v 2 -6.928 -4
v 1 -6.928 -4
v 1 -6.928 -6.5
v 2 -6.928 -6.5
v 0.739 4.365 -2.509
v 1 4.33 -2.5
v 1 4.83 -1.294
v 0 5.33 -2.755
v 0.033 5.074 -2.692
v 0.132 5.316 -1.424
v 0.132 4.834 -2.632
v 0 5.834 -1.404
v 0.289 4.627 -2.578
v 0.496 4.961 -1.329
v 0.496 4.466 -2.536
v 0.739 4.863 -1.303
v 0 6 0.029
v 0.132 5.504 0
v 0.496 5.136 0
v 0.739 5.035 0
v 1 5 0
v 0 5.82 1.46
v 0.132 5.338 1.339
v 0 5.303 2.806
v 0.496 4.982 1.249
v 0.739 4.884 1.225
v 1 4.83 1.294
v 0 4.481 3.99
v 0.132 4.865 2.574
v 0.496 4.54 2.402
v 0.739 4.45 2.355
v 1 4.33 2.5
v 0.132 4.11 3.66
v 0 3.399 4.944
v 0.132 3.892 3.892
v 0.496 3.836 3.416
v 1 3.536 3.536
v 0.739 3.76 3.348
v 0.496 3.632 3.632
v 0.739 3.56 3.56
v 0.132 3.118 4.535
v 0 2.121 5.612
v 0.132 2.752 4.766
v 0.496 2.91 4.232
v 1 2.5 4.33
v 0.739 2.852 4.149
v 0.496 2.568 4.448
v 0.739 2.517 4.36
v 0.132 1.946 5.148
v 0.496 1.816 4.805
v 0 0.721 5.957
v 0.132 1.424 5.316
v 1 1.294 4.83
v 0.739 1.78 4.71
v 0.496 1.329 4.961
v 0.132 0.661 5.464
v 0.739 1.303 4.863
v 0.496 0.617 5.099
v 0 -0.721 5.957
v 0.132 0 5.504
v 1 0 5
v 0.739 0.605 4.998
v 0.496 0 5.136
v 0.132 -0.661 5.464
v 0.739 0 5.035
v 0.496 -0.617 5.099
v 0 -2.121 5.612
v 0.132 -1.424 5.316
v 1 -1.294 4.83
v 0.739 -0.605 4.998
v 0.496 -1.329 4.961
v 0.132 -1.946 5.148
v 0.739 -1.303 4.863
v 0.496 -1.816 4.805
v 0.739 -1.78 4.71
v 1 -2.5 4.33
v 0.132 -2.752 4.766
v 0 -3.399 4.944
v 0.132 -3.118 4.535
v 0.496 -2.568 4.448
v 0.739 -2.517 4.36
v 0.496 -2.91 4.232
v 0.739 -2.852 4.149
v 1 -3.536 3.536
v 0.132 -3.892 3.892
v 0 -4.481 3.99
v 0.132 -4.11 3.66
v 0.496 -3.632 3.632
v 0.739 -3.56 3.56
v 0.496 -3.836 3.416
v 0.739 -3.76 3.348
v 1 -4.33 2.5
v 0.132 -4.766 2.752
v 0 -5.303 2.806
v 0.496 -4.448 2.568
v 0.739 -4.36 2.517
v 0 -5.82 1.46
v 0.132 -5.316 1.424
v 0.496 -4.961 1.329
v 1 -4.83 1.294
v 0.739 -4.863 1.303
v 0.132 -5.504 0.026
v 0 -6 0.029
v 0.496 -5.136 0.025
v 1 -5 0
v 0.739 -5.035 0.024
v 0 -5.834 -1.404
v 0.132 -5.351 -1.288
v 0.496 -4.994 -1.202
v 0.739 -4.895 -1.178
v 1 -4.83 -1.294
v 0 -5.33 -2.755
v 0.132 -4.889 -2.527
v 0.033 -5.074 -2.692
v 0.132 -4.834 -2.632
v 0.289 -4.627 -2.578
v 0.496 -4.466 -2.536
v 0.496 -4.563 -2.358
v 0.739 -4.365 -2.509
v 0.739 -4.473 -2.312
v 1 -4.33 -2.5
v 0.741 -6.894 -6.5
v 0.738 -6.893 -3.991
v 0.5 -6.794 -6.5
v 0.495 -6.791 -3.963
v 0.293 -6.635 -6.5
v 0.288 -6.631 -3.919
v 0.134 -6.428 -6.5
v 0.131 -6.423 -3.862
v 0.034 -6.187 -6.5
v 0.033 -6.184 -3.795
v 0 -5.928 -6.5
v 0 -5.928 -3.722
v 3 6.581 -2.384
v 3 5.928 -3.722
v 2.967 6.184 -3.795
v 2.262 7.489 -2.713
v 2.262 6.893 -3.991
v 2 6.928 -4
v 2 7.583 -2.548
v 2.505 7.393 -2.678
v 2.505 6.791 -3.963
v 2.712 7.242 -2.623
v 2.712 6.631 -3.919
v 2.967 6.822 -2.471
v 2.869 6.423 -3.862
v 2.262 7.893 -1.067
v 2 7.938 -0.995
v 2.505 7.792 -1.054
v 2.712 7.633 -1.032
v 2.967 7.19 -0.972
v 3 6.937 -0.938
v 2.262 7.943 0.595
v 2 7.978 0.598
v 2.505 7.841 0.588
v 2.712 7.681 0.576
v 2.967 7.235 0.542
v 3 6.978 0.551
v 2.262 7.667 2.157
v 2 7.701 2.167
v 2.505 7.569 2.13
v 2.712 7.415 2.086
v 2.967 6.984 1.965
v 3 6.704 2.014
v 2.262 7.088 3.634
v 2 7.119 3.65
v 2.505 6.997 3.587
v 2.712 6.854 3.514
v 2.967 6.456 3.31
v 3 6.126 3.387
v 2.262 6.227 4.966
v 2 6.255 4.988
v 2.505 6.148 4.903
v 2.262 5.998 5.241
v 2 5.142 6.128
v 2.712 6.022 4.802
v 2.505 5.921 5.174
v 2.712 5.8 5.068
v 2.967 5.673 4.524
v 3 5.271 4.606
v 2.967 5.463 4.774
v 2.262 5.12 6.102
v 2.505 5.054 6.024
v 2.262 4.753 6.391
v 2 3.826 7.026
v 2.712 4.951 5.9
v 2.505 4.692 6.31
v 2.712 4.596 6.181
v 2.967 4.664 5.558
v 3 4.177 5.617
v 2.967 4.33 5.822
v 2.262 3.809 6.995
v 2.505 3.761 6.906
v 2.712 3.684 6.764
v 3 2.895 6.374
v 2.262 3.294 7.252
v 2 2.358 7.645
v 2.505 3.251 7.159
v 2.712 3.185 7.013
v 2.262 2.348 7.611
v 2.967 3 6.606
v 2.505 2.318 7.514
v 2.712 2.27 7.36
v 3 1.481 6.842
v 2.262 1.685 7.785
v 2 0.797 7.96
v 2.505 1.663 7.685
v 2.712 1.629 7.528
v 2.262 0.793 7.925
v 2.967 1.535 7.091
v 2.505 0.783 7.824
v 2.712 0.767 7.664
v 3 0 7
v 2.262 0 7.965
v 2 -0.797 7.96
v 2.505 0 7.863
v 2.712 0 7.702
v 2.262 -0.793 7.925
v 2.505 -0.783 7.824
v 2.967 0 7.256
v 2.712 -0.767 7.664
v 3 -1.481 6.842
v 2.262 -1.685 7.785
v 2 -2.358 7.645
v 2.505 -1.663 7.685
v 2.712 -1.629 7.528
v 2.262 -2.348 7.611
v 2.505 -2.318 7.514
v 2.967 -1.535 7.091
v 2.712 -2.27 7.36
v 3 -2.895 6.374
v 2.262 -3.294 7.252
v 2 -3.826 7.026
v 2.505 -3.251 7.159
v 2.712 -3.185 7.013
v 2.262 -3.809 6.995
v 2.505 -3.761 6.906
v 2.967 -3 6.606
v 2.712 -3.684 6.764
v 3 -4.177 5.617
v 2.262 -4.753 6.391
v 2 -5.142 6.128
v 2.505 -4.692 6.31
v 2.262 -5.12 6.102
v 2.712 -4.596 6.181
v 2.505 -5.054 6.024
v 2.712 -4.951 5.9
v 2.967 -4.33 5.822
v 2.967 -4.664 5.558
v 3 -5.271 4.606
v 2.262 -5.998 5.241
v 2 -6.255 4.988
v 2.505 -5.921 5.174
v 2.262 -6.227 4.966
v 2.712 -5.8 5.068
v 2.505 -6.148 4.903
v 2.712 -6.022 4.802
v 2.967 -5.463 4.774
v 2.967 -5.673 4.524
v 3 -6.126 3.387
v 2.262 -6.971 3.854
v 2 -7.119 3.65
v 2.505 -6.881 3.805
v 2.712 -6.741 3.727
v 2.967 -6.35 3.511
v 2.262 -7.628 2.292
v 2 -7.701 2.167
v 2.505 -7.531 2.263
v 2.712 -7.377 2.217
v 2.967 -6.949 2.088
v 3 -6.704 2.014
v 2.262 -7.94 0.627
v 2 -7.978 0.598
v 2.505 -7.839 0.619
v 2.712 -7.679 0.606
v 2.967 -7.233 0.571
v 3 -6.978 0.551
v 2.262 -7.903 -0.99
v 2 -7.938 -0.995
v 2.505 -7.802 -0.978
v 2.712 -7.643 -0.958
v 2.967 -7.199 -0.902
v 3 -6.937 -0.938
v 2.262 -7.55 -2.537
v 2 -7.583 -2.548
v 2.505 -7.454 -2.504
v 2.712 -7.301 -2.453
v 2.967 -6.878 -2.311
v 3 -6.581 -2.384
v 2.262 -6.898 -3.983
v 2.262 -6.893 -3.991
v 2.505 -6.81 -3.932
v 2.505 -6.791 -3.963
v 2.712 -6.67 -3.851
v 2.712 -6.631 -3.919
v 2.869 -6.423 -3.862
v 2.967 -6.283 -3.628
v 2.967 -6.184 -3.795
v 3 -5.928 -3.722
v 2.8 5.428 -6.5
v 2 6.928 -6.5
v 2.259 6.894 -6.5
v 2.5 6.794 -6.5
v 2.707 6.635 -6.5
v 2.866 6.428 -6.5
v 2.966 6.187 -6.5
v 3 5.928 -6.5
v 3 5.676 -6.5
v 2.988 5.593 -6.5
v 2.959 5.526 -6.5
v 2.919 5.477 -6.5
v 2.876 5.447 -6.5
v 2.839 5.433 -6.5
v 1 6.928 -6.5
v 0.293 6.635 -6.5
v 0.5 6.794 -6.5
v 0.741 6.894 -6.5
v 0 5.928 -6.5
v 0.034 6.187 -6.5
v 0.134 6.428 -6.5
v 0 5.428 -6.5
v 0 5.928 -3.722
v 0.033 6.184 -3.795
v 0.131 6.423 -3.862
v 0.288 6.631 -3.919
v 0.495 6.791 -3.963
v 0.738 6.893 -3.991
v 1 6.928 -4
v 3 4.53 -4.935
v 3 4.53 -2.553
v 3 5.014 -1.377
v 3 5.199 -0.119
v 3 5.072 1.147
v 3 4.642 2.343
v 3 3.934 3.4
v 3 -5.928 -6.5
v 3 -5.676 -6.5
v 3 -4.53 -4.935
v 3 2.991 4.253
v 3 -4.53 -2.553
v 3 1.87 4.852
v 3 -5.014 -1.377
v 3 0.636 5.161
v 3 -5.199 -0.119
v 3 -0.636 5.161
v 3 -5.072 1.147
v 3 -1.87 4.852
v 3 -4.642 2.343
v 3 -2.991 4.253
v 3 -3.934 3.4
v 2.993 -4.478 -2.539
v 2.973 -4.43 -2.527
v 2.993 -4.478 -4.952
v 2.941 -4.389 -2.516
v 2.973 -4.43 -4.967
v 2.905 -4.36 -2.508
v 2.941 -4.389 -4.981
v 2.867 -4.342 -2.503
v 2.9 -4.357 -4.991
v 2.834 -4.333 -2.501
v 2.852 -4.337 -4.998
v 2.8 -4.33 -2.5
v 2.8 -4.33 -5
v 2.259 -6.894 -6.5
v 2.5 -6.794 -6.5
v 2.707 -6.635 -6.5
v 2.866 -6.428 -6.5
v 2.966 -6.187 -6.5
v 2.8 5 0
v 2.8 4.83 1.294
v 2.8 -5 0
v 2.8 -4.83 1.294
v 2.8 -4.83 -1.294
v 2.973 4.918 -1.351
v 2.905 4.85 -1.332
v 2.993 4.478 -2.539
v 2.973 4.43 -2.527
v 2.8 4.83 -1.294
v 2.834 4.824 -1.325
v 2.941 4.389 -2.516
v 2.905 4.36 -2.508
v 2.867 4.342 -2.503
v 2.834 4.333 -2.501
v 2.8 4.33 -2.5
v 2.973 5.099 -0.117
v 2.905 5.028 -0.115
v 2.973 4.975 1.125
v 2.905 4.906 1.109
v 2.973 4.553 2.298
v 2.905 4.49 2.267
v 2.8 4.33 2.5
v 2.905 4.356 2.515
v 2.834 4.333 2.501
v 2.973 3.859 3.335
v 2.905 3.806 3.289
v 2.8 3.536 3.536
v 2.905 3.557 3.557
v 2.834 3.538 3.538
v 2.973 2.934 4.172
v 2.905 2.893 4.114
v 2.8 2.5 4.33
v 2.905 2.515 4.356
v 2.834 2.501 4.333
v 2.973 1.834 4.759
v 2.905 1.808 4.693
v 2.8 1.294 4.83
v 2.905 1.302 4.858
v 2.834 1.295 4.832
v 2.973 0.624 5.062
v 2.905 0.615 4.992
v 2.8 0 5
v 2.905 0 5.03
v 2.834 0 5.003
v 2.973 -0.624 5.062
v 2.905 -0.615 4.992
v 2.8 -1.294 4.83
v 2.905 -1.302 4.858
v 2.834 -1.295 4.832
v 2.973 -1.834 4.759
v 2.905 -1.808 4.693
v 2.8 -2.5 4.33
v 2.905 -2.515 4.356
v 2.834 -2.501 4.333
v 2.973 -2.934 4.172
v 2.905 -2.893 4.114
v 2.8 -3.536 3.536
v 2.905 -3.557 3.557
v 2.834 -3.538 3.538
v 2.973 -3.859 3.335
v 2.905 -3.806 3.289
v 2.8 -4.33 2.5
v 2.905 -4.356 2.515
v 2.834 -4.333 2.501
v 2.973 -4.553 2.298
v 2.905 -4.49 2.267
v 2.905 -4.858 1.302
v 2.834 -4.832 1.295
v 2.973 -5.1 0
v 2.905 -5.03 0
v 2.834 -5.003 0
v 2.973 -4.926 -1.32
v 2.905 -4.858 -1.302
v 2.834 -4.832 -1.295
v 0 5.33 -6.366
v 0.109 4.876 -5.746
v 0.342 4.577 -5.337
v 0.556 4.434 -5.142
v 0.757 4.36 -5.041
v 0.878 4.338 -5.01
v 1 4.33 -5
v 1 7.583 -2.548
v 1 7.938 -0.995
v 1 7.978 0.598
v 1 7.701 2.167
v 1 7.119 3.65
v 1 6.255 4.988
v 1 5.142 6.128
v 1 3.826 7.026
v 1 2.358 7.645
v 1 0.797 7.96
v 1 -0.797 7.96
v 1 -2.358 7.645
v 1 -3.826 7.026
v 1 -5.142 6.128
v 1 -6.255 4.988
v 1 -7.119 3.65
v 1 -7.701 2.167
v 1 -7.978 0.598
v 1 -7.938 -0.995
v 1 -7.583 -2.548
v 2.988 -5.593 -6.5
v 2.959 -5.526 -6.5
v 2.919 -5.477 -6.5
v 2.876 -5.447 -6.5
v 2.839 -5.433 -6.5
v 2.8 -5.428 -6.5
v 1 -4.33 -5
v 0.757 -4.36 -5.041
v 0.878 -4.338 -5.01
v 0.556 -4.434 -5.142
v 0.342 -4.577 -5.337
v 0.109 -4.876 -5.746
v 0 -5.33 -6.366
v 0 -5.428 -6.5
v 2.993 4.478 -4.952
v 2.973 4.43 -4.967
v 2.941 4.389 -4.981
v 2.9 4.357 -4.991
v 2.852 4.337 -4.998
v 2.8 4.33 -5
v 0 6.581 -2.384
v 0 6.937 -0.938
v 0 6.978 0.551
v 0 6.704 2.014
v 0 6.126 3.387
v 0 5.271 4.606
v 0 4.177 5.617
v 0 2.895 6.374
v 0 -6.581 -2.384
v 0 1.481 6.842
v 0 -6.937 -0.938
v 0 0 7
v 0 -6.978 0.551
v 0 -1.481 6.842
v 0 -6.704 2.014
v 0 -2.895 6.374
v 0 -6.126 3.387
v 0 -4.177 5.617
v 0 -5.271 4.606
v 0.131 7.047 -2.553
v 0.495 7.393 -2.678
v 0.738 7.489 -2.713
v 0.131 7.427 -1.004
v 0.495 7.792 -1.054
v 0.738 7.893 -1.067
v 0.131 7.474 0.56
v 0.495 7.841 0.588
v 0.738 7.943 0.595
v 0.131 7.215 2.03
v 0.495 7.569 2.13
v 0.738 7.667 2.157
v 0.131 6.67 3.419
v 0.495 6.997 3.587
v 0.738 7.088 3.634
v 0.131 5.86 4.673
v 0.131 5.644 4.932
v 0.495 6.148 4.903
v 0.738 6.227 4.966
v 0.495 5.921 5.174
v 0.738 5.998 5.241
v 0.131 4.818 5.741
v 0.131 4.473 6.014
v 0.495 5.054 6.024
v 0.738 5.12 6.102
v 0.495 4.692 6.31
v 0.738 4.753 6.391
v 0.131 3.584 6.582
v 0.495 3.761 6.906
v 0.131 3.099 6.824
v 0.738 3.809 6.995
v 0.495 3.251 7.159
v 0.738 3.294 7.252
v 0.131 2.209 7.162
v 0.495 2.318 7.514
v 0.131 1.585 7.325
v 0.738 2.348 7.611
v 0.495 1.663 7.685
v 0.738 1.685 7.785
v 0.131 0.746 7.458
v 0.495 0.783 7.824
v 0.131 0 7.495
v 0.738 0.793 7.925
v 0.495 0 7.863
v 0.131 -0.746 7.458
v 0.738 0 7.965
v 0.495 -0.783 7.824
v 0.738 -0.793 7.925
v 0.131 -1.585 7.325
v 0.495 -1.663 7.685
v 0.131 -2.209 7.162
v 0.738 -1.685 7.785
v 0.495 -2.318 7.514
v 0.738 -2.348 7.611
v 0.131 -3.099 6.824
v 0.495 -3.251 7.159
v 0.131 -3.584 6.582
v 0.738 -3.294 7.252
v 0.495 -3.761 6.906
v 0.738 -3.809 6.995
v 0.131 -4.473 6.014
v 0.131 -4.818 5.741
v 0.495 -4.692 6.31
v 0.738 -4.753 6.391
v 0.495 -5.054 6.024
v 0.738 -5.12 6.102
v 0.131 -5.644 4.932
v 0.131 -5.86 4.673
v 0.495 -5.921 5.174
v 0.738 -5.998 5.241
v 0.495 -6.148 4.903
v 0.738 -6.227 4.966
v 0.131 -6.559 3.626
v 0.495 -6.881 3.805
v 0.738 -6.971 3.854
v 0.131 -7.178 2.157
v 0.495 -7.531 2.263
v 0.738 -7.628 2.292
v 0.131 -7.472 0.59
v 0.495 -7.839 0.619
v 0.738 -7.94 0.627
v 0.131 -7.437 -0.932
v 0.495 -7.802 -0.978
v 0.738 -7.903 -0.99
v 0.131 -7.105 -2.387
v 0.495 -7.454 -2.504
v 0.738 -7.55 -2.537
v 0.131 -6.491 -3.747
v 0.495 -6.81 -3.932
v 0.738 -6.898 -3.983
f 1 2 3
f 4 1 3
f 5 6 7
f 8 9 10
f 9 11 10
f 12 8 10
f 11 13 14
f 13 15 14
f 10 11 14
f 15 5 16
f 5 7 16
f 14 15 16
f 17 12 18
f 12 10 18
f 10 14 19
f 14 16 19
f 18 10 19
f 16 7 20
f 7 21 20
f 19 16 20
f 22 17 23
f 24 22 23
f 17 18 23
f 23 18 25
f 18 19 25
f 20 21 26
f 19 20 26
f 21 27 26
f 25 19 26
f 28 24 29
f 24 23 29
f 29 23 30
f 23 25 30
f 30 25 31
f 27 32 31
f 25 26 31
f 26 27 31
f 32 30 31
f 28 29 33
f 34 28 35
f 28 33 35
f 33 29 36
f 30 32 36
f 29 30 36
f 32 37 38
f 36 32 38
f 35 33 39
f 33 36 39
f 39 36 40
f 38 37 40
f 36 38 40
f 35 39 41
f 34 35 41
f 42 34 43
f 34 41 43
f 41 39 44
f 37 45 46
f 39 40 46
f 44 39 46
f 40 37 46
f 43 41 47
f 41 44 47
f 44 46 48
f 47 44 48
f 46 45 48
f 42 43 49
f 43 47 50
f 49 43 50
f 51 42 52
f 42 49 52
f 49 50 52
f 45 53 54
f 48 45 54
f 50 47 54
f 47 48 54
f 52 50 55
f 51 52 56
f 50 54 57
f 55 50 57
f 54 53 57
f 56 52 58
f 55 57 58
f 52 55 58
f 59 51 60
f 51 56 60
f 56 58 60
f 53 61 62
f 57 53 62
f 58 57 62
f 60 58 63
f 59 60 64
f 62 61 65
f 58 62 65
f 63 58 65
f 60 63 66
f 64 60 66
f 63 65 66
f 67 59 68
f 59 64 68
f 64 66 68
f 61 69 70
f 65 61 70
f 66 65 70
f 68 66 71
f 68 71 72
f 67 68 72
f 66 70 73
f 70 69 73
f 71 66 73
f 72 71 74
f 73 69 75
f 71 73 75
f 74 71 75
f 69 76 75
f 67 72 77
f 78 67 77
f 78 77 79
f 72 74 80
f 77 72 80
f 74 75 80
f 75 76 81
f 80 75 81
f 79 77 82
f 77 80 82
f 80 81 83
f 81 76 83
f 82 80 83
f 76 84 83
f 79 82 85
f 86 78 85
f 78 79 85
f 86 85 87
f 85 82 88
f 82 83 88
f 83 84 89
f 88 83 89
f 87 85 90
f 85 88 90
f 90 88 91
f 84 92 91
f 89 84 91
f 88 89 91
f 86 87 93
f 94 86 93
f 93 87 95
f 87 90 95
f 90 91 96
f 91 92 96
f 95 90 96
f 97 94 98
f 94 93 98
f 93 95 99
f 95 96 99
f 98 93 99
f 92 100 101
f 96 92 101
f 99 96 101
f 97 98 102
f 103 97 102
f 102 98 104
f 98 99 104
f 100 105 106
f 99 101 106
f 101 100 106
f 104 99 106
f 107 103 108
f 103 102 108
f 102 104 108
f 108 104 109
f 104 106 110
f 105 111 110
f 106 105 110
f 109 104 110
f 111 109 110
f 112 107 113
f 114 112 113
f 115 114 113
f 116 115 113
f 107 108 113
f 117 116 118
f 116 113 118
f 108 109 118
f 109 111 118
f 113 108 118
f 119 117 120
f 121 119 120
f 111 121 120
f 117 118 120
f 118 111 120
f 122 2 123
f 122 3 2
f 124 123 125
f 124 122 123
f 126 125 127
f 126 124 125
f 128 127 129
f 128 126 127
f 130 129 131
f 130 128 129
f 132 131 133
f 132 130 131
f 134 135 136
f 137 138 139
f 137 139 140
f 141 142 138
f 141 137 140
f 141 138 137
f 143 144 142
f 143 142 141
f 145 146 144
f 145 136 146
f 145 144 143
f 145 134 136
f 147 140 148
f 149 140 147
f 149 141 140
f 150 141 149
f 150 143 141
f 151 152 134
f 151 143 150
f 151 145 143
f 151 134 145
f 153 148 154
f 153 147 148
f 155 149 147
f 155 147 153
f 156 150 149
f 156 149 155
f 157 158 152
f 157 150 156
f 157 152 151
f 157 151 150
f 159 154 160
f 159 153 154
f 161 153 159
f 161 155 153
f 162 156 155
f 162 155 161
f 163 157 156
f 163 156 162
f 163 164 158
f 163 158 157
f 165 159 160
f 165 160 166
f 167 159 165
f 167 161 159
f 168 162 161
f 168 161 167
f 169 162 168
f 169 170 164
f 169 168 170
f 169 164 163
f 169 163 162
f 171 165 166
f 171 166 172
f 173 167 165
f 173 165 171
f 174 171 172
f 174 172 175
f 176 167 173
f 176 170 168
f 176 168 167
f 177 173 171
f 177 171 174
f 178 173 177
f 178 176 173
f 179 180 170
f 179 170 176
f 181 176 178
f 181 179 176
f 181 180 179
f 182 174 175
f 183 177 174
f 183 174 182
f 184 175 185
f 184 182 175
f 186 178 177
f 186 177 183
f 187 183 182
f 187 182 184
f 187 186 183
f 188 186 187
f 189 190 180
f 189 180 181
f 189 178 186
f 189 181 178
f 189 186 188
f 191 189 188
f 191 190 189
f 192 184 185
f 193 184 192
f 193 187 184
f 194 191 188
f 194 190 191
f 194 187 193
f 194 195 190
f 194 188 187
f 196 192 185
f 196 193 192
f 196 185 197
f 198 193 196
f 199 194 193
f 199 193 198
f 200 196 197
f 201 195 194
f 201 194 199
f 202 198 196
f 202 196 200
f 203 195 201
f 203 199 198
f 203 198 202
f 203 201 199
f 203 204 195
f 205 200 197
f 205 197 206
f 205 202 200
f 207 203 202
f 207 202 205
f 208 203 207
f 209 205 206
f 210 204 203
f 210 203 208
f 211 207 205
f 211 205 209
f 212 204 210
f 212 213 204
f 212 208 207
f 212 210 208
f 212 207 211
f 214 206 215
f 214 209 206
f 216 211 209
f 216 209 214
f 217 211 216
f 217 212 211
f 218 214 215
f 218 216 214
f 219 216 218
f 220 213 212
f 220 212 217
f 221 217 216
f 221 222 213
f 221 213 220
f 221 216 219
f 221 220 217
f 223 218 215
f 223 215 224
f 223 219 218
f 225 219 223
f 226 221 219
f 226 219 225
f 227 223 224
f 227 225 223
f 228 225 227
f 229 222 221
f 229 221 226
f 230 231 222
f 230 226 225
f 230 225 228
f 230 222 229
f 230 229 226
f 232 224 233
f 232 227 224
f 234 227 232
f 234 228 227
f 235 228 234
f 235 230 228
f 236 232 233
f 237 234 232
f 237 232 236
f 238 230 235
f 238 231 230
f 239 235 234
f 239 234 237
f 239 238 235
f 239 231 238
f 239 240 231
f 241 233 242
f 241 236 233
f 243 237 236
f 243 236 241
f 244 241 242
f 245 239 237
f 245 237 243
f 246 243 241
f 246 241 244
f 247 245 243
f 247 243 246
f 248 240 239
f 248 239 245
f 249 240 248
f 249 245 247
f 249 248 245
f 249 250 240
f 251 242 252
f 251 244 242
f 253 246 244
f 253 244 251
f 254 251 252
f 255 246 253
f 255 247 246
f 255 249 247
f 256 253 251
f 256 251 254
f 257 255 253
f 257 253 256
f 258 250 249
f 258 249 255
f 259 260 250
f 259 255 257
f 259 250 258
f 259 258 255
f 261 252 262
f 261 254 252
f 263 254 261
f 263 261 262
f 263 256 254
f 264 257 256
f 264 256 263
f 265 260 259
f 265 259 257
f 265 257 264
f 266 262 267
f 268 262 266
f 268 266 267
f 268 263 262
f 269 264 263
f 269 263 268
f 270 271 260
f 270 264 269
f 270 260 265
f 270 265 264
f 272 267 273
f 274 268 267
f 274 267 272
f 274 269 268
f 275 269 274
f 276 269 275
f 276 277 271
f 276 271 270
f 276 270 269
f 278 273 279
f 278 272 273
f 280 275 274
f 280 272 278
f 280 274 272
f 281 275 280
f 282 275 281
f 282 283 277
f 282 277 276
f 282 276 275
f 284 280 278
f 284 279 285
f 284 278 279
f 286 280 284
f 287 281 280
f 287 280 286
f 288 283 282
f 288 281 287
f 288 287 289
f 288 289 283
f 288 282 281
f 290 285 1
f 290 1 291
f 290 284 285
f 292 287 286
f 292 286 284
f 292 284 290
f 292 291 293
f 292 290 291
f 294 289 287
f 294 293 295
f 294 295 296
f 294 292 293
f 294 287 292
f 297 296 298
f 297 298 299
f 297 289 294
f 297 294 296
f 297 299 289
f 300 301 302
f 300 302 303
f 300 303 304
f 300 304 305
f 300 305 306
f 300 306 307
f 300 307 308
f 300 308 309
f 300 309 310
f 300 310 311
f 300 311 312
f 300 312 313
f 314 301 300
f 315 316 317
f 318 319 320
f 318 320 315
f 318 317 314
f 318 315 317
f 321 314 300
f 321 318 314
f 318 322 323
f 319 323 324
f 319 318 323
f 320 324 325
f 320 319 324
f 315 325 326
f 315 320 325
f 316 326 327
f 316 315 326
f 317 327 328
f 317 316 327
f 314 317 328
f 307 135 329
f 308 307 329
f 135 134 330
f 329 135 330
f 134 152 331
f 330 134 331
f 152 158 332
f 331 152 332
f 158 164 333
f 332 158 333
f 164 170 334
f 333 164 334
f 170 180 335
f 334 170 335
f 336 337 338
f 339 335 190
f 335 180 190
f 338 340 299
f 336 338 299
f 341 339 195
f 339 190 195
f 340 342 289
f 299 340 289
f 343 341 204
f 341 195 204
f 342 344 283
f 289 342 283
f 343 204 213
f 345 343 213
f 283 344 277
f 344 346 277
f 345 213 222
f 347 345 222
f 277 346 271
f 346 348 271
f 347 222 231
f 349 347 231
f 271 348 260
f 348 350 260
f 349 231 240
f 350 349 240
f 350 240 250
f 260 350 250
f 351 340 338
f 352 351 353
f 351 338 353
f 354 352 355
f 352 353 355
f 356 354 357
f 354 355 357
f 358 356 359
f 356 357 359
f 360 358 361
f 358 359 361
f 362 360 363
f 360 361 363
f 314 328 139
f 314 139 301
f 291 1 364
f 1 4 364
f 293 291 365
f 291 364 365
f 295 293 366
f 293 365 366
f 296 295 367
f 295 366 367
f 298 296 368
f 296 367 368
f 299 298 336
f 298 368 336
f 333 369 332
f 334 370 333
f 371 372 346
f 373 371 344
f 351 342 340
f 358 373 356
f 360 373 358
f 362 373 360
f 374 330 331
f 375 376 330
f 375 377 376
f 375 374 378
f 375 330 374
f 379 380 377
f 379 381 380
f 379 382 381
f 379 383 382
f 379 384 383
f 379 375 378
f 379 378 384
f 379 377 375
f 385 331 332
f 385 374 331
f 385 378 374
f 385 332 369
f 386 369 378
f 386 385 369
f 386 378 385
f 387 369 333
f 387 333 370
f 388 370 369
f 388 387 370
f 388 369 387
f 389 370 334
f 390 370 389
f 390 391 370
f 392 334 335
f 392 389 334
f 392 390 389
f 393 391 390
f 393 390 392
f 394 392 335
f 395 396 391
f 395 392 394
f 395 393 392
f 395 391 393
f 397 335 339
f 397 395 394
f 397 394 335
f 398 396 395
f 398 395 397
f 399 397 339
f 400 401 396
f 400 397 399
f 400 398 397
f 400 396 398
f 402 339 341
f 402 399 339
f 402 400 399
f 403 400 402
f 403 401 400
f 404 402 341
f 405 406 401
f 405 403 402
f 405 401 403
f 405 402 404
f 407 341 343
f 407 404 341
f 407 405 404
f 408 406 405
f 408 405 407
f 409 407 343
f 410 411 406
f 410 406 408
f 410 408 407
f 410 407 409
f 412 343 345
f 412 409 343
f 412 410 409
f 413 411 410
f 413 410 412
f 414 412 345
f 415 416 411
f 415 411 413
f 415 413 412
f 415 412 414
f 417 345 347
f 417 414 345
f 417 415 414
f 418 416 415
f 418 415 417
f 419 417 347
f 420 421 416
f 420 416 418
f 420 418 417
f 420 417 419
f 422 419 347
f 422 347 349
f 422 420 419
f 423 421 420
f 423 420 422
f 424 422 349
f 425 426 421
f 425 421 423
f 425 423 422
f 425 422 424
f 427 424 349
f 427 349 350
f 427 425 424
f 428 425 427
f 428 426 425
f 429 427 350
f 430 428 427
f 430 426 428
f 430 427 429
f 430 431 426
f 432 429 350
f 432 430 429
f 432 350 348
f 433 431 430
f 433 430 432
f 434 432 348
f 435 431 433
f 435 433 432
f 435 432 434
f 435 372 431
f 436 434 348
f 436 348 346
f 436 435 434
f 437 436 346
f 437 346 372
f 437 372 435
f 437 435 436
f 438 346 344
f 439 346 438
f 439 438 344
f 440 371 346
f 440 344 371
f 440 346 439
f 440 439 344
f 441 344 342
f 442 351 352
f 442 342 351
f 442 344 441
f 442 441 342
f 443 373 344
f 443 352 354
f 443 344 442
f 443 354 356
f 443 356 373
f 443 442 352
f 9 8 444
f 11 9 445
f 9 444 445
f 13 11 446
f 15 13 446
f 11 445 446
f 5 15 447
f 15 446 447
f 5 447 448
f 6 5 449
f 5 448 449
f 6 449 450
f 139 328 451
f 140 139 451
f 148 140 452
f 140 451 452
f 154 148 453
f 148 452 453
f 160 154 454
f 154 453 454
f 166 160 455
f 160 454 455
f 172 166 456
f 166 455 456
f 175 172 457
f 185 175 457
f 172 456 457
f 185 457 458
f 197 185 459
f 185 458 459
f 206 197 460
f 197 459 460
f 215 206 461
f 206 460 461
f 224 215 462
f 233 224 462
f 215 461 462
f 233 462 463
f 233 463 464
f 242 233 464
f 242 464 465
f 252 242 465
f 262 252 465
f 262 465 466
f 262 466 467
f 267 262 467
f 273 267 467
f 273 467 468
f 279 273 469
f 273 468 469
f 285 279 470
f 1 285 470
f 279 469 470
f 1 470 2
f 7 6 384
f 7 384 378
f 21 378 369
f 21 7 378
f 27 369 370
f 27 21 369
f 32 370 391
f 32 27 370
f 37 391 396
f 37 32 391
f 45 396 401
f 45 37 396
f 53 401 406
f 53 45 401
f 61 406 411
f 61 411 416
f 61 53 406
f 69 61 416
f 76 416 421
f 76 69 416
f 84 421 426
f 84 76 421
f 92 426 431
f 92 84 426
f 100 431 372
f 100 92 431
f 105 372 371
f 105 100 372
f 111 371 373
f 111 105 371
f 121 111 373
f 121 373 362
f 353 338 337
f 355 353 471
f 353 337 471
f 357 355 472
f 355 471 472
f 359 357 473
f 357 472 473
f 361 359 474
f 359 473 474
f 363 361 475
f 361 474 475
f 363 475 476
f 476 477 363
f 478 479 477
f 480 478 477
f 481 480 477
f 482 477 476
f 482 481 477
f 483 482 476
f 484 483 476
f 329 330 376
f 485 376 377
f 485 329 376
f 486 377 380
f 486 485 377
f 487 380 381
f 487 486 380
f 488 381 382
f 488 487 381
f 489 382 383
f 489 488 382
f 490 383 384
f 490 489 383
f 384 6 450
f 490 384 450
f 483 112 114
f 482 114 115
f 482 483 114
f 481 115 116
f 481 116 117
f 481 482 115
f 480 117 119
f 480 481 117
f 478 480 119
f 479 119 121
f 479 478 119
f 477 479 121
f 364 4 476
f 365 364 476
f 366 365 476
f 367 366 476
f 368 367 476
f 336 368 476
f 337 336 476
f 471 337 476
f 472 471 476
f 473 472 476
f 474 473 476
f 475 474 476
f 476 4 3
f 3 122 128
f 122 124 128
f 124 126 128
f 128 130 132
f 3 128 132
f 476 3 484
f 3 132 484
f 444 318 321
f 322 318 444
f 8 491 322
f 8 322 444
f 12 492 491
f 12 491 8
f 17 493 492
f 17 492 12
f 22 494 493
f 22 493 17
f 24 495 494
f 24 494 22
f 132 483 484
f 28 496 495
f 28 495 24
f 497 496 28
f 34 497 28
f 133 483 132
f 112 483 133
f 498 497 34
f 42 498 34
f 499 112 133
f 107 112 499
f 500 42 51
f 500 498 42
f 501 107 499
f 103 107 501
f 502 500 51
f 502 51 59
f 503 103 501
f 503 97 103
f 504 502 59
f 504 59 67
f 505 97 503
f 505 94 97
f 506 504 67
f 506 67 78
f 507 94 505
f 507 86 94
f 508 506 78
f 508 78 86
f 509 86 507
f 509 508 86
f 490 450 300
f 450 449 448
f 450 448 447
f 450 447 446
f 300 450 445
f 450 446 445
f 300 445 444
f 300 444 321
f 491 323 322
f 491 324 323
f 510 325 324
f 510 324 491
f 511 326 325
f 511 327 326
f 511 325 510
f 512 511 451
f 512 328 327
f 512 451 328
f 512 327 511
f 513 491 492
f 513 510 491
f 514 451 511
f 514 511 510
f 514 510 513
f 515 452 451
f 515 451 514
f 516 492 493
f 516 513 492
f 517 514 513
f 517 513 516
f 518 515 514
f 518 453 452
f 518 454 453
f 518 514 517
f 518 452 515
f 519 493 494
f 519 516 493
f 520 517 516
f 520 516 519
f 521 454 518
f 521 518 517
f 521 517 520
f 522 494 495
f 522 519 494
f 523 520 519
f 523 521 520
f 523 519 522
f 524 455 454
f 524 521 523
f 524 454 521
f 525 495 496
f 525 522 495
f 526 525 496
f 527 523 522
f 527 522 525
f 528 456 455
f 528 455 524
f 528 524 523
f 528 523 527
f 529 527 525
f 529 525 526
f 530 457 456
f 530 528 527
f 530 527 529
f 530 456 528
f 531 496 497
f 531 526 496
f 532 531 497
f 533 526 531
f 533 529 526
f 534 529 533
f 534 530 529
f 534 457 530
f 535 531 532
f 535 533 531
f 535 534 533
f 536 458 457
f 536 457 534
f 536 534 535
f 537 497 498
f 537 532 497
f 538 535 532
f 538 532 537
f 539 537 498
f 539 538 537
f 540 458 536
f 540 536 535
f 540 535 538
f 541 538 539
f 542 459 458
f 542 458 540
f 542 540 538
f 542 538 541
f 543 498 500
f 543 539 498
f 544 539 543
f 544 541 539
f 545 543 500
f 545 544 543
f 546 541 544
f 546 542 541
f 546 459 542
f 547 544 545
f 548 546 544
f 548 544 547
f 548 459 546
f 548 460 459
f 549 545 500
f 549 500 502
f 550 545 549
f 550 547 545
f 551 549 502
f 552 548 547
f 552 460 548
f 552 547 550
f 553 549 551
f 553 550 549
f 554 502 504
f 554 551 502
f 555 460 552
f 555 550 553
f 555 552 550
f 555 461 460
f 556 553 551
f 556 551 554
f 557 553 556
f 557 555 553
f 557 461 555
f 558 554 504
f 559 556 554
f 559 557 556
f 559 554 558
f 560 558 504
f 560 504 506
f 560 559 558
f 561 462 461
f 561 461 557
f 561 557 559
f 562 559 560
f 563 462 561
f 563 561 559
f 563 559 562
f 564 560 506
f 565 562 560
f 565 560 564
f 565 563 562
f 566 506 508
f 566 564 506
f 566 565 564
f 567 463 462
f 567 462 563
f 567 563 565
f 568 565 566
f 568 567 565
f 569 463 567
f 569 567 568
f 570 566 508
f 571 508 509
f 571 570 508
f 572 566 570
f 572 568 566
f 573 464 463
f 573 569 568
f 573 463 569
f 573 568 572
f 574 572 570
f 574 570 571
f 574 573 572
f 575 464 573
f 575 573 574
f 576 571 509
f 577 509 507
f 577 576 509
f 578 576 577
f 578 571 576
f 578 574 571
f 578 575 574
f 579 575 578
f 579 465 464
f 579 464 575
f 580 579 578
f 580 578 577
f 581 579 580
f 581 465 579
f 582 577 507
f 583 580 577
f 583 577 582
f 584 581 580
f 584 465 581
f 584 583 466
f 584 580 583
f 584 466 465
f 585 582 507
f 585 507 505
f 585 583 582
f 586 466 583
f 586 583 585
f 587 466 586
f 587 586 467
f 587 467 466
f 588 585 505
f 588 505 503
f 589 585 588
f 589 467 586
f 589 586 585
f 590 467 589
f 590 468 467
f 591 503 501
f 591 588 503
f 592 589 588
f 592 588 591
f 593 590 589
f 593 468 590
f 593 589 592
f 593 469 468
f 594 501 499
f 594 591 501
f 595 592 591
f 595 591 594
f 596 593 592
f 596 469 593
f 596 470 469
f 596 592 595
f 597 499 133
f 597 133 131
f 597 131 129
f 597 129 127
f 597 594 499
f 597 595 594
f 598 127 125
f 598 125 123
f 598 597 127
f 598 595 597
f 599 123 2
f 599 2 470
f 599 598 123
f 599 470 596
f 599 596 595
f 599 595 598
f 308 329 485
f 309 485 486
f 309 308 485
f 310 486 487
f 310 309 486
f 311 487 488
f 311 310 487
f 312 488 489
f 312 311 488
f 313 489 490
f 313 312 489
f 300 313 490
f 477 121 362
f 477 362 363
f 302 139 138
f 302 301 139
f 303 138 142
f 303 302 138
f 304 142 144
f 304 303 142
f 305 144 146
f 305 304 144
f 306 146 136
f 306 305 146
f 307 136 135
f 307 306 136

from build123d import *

# Parameters (mm, degrees)
PAD_DEPTH   = 3
FILLET_R    = 1
FILLET001_R = 0.2
FILLET002_R = 1


with BuildPart() as part:
    # Sketch → Pad (new body)
    with BuildSketch(Plane.YZ):
        with BuildLine():
            ThreePointArc((4.330127, -2.5), (0, 5), (-4.330127, -2.5))
            Line((-4.330127, -2.5), (-4.330127, -5))
            Line((-4.330127, -5), (-5.428204, -6.499999))
            Line((-6.928204, -6.499999), (-5.428204, -6.499999))
            Line((-6.928204, -3.999999), (-6.928204, -6.499999))
            ThreePointArc((6.928204, -3.999999), (0, 8), (-6.928204, -3.999999))
            Line((6.928204, -3.999999), (6.928204, -6.499999))
            Line((6.928204, -6.499999), (5.428204, -6.499999))
            Line((4.330127, -5), (5.428204, -6.499999))
            Line((4.330127, -2.5), (4.330127, -5))
        make_face()
    extrude(amount=PAD_DEPTH)

    # Fillet
    fillet_edges = [part.edges().sort_by_distance(p)[0] for p in [
        (3, -6.928204, -5.249999),
        (3, 0, 8),
        (3, 6.928204, -5.249999),
    ]]
    fillet(fillet_edges, radius=FILLET_R)

    # Fillet001
    fillet001_edges = [part.edges().sort_by_distance(p)[0] for p in [
        (3, 0, 5),
        (3, -4.330127, -3.75),
        (3, -4.879165, -5.749999),
        (3, 4.330127, -3.75),
        (3, 4.879165, -5.749999),
    ]]
    fillet(fillet001_edges, radius=FILLET001_R)

    # Fillet002
    fillet002_edges = [part.edges().sort_by_distance(p)[0] for p in [
        (0, 0, 8),
        (0, 6.928204, -5.249999),
        (0, 4.330127, -3.75),
        (0, 0, 5),
        (0, -4.330127, -3.75),
        (0, -6.928204, -5.249999),
    ]]
    fillet(fillet002_edges, radius=FILLET002_R)


solid = part.part
